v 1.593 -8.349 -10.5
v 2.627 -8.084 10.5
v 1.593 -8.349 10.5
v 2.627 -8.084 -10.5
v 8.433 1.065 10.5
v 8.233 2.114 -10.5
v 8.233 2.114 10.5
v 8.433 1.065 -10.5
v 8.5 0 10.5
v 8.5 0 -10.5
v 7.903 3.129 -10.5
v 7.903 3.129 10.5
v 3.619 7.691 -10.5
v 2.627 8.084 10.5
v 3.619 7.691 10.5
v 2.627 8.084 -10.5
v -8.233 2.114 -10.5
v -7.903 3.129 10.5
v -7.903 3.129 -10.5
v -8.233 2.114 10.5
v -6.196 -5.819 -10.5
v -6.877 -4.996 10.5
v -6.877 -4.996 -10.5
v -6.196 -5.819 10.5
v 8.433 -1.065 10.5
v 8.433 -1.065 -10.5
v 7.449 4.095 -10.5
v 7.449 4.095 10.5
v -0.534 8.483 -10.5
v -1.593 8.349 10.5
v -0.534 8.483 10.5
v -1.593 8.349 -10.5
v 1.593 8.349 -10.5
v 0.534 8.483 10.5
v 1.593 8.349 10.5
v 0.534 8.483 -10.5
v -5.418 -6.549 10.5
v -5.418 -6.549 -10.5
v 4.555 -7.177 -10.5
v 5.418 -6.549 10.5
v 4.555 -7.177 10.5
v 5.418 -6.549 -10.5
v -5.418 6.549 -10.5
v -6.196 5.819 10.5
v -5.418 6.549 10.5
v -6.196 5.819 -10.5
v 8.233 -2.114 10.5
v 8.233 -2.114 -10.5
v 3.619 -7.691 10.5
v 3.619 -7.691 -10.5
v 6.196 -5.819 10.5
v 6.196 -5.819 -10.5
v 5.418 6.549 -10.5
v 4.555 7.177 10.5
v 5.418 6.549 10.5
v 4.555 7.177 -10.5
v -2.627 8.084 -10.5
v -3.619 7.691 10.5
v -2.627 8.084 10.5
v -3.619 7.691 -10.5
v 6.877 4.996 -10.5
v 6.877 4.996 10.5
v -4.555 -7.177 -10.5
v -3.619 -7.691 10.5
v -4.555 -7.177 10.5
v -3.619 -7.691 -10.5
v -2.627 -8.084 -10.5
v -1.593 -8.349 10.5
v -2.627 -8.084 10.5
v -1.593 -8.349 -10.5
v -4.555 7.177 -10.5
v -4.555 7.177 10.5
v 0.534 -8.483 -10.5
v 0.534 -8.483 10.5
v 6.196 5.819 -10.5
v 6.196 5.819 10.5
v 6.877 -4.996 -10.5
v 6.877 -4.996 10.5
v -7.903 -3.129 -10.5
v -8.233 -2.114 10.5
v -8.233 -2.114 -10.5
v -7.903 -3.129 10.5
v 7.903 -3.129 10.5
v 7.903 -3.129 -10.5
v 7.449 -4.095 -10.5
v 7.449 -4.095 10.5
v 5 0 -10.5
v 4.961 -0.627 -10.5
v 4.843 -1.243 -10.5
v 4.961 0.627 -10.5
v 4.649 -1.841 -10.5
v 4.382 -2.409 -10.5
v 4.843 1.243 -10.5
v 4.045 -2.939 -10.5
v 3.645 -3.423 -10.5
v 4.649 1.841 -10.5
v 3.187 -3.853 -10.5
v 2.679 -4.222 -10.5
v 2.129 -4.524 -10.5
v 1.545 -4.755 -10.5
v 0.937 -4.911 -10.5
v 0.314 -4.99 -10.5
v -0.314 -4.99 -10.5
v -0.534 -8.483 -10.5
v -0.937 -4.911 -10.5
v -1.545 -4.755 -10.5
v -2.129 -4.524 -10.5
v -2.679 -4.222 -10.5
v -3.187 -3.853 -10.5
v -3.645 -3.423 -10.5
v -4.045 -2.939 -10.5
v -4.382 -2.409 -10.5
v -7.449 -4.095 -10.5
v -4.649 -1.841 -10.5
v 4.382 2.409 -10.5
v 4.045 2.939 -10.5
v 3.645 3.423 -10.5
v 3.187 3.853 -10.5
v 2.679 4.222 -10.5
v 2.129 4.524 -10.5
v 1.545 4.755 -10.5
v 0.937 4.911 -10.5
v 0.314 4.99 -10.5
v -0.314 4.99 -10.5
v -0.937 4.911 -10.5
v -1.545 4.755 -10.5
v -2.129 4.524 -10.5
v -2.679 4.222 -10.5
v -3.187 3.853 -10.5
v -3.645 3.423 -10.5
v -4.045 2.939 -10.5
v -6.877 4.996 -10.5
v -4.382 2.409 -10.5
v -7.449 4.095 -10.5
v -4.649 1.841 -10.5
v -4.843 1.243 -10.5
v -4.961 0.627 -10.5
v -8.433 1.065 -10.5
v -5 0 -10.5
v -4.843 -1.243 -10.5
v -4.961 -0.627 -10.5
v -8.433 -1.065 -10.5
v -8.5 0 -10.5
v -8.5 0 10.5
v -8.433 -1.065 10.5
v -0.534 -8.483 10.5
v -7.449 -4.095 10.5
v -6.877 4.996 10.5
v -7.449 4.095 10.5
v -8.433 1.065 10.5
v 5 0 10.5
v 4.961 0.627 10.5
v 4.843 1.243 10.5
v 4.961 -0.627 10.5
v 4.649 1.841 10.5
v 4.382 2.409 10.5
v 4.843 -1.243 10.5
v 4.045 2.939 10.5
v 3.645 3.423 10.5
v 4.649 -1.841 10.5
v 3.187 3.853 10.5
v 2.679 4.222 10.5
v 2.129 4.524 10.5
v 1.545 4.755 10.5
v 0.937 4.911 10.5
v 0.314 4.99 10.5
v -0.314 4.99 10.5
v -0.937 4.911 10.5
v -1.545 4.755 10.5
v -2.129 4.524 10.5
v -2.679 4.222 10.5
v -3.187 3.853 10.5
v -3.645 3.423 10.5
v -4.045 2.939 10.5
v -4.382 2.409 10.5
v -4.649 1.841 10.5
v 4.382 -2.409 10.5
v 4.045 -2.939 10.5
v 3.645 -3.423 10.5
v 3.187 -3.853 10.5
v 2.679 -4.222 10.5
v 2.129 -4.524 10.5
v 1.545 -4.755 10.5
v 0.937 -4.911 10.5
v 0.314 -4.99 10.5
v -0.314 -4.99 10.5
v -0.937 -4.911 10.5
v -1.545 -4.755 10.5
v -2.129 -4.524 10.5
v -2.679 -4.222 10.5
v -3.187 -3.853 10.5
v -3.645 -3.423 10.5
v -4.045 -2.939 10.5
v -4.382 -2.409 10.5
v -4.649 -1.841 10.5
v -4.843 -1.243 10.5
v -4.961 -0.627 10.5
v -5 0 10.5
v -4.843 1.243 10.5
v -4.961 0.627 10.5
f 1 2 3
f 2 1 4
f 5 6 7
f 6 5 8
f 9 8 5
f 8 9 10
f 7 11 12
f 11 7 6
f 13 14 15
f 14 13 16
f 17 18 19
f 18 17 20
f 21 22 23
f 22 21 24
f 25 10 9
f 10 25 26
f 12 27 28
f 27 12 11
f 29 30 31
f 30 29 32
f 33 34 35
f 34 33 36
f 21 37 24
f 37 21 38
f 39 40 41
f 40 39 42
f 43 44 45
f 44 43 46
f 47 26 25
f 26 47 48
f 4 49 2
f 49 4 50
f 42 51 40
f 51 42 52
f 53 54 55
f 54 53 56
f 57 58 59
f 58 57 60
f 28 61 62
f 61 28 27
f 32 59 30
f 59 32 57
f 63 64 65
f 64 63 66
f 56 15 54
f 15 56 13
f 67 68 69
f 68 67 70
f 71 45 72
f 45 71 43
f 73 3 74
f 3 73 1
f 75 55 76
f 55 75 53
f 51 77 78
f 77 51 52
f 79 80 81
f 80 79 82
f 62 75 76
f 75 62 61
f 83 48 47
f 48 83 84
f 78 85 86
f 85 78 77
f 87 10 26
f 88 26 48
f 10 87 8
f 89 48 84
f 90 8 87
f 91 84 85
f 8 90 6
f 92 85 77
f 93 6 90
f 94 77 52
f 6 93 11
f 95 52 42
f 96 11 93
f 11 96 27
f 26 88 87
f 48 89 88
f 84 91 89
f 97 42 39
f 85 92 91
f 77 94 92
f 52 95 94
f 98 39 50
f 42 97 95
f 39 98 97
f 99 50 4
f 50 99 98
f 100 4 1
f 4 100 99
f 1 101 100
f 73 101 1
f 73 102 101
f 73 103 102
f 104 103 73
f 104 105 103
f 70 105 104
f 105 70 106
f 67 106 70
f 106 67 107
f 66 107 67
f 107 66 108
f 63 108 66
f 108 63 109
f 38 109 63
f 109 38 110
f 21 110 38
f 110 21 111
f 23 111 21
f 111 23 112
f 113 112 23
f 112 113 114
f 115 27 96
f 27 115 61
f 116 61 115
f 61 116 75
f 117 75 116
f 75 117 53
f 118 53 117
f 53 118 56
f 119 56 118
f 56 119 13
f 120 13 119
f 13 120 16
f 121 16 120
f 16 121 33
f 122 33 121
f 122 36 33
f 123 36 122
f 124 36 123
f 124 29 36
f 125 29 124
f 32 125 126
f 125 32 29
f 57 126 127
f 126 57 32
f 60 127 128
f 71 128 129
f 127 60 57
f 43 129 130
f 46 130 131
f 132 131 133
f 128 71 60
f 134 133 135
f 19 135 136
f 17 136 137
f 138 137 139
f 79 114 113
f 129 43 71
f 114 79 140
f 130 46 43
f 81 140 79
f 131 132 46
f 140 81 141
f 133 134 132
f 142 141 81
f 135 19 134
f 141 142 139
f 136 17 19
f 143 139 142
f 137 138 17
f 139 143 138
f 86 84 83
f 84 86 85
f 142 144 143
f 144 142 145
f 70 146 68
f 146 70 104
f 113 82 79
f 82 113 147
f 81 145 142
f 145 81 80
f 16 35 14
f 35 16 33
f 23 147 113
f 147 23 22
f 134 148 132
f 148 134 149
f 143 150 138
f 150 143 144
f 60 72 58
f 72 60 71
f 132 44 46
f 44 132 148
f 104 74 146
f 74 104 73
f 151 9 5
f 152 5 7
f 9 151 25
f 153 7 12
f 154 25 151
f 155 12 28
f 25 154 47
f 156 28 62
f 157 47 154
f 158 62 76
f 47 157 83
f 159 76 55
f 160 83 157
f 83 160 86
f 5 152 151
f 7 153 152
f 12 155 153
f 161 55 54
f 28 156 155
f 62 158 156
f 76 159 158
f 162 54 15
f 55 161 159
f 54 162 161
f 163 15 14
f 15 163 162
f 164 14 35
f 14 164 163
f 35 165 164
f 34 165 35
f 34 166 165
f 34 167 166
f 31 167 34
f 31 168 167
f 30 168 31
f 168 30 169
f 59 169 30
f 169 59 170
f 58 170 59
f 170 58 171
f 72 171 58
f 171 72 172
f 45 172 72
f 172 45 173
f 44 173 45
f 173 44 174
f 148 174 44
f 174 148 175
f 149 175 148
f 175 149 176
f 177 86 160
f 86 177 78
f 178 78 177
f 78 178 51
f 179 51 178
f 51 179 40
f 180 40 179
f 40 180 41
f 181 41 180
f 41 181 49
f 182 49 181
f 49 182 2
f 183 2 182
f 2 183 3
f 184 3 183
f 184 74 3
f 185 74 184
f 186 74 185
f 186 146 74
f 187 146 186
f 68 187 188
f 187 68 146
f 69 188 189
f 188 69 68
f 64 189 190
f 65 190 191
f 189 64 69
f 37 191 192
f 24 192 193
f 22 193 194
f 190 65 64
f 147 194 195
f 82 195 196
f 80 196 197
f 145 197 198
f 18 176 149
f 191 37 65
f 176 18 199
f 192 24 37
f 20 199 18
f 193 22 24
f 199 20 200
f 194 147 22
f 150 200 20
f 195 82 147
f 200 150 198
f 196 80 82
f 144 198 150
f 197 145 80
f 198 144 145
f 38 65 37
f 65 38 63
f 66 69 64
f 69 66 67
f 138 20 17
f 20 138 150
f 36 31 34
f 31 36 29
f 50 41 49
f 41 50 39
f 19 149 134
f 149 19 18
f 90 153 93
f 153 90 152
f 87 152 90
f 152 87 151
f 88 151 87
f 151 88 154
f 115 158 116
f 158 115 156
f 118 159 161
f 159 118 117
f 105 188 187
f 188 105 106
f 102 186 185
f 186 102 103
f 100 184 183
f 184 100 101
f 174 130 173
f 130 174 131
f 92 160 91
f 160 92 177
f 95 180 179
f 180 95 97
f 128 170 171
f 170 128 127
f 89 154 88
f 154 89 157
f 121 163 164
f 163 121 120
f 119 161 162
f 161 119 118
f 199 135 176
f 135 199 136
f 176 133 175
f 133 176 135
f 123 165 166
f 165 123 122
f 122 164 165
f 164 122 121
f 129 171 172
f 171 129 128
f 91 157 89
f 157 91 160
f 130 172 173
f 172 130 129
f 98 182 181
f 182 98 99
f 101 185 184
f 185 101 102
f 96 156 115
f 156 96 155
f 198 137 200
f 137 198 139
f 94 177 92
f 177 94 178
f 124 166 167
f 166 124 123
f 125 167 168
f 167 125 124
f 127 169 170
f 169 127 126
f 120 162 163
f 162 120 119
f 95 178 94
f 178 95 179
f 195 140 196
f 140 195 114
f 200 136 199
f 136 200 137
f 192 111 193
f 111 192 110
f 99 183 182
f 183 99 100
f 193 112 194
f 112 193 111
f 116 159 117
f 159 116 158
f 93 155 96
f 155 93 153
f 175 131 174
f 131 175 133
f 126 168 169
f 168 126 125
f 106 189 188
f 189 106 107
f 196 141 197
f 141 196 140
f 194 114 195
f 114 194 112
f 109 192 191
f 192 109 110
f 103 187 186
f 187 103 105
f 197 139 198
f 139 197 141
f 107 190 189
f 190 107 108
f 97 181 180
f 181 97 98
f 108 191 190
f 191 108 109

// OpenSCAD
$fn = 50;


difference() {
	union() {
		translate(v = [0, 0, -10.5000000000]) {
			cylinder(h = 21, r = 8.5000000000);
		}
	}
	union() {
		translate(v = [0, 0, -100.0000000000]) {
			cylinder(h = 200, r = 5.0000000000);
		}
	}
}
